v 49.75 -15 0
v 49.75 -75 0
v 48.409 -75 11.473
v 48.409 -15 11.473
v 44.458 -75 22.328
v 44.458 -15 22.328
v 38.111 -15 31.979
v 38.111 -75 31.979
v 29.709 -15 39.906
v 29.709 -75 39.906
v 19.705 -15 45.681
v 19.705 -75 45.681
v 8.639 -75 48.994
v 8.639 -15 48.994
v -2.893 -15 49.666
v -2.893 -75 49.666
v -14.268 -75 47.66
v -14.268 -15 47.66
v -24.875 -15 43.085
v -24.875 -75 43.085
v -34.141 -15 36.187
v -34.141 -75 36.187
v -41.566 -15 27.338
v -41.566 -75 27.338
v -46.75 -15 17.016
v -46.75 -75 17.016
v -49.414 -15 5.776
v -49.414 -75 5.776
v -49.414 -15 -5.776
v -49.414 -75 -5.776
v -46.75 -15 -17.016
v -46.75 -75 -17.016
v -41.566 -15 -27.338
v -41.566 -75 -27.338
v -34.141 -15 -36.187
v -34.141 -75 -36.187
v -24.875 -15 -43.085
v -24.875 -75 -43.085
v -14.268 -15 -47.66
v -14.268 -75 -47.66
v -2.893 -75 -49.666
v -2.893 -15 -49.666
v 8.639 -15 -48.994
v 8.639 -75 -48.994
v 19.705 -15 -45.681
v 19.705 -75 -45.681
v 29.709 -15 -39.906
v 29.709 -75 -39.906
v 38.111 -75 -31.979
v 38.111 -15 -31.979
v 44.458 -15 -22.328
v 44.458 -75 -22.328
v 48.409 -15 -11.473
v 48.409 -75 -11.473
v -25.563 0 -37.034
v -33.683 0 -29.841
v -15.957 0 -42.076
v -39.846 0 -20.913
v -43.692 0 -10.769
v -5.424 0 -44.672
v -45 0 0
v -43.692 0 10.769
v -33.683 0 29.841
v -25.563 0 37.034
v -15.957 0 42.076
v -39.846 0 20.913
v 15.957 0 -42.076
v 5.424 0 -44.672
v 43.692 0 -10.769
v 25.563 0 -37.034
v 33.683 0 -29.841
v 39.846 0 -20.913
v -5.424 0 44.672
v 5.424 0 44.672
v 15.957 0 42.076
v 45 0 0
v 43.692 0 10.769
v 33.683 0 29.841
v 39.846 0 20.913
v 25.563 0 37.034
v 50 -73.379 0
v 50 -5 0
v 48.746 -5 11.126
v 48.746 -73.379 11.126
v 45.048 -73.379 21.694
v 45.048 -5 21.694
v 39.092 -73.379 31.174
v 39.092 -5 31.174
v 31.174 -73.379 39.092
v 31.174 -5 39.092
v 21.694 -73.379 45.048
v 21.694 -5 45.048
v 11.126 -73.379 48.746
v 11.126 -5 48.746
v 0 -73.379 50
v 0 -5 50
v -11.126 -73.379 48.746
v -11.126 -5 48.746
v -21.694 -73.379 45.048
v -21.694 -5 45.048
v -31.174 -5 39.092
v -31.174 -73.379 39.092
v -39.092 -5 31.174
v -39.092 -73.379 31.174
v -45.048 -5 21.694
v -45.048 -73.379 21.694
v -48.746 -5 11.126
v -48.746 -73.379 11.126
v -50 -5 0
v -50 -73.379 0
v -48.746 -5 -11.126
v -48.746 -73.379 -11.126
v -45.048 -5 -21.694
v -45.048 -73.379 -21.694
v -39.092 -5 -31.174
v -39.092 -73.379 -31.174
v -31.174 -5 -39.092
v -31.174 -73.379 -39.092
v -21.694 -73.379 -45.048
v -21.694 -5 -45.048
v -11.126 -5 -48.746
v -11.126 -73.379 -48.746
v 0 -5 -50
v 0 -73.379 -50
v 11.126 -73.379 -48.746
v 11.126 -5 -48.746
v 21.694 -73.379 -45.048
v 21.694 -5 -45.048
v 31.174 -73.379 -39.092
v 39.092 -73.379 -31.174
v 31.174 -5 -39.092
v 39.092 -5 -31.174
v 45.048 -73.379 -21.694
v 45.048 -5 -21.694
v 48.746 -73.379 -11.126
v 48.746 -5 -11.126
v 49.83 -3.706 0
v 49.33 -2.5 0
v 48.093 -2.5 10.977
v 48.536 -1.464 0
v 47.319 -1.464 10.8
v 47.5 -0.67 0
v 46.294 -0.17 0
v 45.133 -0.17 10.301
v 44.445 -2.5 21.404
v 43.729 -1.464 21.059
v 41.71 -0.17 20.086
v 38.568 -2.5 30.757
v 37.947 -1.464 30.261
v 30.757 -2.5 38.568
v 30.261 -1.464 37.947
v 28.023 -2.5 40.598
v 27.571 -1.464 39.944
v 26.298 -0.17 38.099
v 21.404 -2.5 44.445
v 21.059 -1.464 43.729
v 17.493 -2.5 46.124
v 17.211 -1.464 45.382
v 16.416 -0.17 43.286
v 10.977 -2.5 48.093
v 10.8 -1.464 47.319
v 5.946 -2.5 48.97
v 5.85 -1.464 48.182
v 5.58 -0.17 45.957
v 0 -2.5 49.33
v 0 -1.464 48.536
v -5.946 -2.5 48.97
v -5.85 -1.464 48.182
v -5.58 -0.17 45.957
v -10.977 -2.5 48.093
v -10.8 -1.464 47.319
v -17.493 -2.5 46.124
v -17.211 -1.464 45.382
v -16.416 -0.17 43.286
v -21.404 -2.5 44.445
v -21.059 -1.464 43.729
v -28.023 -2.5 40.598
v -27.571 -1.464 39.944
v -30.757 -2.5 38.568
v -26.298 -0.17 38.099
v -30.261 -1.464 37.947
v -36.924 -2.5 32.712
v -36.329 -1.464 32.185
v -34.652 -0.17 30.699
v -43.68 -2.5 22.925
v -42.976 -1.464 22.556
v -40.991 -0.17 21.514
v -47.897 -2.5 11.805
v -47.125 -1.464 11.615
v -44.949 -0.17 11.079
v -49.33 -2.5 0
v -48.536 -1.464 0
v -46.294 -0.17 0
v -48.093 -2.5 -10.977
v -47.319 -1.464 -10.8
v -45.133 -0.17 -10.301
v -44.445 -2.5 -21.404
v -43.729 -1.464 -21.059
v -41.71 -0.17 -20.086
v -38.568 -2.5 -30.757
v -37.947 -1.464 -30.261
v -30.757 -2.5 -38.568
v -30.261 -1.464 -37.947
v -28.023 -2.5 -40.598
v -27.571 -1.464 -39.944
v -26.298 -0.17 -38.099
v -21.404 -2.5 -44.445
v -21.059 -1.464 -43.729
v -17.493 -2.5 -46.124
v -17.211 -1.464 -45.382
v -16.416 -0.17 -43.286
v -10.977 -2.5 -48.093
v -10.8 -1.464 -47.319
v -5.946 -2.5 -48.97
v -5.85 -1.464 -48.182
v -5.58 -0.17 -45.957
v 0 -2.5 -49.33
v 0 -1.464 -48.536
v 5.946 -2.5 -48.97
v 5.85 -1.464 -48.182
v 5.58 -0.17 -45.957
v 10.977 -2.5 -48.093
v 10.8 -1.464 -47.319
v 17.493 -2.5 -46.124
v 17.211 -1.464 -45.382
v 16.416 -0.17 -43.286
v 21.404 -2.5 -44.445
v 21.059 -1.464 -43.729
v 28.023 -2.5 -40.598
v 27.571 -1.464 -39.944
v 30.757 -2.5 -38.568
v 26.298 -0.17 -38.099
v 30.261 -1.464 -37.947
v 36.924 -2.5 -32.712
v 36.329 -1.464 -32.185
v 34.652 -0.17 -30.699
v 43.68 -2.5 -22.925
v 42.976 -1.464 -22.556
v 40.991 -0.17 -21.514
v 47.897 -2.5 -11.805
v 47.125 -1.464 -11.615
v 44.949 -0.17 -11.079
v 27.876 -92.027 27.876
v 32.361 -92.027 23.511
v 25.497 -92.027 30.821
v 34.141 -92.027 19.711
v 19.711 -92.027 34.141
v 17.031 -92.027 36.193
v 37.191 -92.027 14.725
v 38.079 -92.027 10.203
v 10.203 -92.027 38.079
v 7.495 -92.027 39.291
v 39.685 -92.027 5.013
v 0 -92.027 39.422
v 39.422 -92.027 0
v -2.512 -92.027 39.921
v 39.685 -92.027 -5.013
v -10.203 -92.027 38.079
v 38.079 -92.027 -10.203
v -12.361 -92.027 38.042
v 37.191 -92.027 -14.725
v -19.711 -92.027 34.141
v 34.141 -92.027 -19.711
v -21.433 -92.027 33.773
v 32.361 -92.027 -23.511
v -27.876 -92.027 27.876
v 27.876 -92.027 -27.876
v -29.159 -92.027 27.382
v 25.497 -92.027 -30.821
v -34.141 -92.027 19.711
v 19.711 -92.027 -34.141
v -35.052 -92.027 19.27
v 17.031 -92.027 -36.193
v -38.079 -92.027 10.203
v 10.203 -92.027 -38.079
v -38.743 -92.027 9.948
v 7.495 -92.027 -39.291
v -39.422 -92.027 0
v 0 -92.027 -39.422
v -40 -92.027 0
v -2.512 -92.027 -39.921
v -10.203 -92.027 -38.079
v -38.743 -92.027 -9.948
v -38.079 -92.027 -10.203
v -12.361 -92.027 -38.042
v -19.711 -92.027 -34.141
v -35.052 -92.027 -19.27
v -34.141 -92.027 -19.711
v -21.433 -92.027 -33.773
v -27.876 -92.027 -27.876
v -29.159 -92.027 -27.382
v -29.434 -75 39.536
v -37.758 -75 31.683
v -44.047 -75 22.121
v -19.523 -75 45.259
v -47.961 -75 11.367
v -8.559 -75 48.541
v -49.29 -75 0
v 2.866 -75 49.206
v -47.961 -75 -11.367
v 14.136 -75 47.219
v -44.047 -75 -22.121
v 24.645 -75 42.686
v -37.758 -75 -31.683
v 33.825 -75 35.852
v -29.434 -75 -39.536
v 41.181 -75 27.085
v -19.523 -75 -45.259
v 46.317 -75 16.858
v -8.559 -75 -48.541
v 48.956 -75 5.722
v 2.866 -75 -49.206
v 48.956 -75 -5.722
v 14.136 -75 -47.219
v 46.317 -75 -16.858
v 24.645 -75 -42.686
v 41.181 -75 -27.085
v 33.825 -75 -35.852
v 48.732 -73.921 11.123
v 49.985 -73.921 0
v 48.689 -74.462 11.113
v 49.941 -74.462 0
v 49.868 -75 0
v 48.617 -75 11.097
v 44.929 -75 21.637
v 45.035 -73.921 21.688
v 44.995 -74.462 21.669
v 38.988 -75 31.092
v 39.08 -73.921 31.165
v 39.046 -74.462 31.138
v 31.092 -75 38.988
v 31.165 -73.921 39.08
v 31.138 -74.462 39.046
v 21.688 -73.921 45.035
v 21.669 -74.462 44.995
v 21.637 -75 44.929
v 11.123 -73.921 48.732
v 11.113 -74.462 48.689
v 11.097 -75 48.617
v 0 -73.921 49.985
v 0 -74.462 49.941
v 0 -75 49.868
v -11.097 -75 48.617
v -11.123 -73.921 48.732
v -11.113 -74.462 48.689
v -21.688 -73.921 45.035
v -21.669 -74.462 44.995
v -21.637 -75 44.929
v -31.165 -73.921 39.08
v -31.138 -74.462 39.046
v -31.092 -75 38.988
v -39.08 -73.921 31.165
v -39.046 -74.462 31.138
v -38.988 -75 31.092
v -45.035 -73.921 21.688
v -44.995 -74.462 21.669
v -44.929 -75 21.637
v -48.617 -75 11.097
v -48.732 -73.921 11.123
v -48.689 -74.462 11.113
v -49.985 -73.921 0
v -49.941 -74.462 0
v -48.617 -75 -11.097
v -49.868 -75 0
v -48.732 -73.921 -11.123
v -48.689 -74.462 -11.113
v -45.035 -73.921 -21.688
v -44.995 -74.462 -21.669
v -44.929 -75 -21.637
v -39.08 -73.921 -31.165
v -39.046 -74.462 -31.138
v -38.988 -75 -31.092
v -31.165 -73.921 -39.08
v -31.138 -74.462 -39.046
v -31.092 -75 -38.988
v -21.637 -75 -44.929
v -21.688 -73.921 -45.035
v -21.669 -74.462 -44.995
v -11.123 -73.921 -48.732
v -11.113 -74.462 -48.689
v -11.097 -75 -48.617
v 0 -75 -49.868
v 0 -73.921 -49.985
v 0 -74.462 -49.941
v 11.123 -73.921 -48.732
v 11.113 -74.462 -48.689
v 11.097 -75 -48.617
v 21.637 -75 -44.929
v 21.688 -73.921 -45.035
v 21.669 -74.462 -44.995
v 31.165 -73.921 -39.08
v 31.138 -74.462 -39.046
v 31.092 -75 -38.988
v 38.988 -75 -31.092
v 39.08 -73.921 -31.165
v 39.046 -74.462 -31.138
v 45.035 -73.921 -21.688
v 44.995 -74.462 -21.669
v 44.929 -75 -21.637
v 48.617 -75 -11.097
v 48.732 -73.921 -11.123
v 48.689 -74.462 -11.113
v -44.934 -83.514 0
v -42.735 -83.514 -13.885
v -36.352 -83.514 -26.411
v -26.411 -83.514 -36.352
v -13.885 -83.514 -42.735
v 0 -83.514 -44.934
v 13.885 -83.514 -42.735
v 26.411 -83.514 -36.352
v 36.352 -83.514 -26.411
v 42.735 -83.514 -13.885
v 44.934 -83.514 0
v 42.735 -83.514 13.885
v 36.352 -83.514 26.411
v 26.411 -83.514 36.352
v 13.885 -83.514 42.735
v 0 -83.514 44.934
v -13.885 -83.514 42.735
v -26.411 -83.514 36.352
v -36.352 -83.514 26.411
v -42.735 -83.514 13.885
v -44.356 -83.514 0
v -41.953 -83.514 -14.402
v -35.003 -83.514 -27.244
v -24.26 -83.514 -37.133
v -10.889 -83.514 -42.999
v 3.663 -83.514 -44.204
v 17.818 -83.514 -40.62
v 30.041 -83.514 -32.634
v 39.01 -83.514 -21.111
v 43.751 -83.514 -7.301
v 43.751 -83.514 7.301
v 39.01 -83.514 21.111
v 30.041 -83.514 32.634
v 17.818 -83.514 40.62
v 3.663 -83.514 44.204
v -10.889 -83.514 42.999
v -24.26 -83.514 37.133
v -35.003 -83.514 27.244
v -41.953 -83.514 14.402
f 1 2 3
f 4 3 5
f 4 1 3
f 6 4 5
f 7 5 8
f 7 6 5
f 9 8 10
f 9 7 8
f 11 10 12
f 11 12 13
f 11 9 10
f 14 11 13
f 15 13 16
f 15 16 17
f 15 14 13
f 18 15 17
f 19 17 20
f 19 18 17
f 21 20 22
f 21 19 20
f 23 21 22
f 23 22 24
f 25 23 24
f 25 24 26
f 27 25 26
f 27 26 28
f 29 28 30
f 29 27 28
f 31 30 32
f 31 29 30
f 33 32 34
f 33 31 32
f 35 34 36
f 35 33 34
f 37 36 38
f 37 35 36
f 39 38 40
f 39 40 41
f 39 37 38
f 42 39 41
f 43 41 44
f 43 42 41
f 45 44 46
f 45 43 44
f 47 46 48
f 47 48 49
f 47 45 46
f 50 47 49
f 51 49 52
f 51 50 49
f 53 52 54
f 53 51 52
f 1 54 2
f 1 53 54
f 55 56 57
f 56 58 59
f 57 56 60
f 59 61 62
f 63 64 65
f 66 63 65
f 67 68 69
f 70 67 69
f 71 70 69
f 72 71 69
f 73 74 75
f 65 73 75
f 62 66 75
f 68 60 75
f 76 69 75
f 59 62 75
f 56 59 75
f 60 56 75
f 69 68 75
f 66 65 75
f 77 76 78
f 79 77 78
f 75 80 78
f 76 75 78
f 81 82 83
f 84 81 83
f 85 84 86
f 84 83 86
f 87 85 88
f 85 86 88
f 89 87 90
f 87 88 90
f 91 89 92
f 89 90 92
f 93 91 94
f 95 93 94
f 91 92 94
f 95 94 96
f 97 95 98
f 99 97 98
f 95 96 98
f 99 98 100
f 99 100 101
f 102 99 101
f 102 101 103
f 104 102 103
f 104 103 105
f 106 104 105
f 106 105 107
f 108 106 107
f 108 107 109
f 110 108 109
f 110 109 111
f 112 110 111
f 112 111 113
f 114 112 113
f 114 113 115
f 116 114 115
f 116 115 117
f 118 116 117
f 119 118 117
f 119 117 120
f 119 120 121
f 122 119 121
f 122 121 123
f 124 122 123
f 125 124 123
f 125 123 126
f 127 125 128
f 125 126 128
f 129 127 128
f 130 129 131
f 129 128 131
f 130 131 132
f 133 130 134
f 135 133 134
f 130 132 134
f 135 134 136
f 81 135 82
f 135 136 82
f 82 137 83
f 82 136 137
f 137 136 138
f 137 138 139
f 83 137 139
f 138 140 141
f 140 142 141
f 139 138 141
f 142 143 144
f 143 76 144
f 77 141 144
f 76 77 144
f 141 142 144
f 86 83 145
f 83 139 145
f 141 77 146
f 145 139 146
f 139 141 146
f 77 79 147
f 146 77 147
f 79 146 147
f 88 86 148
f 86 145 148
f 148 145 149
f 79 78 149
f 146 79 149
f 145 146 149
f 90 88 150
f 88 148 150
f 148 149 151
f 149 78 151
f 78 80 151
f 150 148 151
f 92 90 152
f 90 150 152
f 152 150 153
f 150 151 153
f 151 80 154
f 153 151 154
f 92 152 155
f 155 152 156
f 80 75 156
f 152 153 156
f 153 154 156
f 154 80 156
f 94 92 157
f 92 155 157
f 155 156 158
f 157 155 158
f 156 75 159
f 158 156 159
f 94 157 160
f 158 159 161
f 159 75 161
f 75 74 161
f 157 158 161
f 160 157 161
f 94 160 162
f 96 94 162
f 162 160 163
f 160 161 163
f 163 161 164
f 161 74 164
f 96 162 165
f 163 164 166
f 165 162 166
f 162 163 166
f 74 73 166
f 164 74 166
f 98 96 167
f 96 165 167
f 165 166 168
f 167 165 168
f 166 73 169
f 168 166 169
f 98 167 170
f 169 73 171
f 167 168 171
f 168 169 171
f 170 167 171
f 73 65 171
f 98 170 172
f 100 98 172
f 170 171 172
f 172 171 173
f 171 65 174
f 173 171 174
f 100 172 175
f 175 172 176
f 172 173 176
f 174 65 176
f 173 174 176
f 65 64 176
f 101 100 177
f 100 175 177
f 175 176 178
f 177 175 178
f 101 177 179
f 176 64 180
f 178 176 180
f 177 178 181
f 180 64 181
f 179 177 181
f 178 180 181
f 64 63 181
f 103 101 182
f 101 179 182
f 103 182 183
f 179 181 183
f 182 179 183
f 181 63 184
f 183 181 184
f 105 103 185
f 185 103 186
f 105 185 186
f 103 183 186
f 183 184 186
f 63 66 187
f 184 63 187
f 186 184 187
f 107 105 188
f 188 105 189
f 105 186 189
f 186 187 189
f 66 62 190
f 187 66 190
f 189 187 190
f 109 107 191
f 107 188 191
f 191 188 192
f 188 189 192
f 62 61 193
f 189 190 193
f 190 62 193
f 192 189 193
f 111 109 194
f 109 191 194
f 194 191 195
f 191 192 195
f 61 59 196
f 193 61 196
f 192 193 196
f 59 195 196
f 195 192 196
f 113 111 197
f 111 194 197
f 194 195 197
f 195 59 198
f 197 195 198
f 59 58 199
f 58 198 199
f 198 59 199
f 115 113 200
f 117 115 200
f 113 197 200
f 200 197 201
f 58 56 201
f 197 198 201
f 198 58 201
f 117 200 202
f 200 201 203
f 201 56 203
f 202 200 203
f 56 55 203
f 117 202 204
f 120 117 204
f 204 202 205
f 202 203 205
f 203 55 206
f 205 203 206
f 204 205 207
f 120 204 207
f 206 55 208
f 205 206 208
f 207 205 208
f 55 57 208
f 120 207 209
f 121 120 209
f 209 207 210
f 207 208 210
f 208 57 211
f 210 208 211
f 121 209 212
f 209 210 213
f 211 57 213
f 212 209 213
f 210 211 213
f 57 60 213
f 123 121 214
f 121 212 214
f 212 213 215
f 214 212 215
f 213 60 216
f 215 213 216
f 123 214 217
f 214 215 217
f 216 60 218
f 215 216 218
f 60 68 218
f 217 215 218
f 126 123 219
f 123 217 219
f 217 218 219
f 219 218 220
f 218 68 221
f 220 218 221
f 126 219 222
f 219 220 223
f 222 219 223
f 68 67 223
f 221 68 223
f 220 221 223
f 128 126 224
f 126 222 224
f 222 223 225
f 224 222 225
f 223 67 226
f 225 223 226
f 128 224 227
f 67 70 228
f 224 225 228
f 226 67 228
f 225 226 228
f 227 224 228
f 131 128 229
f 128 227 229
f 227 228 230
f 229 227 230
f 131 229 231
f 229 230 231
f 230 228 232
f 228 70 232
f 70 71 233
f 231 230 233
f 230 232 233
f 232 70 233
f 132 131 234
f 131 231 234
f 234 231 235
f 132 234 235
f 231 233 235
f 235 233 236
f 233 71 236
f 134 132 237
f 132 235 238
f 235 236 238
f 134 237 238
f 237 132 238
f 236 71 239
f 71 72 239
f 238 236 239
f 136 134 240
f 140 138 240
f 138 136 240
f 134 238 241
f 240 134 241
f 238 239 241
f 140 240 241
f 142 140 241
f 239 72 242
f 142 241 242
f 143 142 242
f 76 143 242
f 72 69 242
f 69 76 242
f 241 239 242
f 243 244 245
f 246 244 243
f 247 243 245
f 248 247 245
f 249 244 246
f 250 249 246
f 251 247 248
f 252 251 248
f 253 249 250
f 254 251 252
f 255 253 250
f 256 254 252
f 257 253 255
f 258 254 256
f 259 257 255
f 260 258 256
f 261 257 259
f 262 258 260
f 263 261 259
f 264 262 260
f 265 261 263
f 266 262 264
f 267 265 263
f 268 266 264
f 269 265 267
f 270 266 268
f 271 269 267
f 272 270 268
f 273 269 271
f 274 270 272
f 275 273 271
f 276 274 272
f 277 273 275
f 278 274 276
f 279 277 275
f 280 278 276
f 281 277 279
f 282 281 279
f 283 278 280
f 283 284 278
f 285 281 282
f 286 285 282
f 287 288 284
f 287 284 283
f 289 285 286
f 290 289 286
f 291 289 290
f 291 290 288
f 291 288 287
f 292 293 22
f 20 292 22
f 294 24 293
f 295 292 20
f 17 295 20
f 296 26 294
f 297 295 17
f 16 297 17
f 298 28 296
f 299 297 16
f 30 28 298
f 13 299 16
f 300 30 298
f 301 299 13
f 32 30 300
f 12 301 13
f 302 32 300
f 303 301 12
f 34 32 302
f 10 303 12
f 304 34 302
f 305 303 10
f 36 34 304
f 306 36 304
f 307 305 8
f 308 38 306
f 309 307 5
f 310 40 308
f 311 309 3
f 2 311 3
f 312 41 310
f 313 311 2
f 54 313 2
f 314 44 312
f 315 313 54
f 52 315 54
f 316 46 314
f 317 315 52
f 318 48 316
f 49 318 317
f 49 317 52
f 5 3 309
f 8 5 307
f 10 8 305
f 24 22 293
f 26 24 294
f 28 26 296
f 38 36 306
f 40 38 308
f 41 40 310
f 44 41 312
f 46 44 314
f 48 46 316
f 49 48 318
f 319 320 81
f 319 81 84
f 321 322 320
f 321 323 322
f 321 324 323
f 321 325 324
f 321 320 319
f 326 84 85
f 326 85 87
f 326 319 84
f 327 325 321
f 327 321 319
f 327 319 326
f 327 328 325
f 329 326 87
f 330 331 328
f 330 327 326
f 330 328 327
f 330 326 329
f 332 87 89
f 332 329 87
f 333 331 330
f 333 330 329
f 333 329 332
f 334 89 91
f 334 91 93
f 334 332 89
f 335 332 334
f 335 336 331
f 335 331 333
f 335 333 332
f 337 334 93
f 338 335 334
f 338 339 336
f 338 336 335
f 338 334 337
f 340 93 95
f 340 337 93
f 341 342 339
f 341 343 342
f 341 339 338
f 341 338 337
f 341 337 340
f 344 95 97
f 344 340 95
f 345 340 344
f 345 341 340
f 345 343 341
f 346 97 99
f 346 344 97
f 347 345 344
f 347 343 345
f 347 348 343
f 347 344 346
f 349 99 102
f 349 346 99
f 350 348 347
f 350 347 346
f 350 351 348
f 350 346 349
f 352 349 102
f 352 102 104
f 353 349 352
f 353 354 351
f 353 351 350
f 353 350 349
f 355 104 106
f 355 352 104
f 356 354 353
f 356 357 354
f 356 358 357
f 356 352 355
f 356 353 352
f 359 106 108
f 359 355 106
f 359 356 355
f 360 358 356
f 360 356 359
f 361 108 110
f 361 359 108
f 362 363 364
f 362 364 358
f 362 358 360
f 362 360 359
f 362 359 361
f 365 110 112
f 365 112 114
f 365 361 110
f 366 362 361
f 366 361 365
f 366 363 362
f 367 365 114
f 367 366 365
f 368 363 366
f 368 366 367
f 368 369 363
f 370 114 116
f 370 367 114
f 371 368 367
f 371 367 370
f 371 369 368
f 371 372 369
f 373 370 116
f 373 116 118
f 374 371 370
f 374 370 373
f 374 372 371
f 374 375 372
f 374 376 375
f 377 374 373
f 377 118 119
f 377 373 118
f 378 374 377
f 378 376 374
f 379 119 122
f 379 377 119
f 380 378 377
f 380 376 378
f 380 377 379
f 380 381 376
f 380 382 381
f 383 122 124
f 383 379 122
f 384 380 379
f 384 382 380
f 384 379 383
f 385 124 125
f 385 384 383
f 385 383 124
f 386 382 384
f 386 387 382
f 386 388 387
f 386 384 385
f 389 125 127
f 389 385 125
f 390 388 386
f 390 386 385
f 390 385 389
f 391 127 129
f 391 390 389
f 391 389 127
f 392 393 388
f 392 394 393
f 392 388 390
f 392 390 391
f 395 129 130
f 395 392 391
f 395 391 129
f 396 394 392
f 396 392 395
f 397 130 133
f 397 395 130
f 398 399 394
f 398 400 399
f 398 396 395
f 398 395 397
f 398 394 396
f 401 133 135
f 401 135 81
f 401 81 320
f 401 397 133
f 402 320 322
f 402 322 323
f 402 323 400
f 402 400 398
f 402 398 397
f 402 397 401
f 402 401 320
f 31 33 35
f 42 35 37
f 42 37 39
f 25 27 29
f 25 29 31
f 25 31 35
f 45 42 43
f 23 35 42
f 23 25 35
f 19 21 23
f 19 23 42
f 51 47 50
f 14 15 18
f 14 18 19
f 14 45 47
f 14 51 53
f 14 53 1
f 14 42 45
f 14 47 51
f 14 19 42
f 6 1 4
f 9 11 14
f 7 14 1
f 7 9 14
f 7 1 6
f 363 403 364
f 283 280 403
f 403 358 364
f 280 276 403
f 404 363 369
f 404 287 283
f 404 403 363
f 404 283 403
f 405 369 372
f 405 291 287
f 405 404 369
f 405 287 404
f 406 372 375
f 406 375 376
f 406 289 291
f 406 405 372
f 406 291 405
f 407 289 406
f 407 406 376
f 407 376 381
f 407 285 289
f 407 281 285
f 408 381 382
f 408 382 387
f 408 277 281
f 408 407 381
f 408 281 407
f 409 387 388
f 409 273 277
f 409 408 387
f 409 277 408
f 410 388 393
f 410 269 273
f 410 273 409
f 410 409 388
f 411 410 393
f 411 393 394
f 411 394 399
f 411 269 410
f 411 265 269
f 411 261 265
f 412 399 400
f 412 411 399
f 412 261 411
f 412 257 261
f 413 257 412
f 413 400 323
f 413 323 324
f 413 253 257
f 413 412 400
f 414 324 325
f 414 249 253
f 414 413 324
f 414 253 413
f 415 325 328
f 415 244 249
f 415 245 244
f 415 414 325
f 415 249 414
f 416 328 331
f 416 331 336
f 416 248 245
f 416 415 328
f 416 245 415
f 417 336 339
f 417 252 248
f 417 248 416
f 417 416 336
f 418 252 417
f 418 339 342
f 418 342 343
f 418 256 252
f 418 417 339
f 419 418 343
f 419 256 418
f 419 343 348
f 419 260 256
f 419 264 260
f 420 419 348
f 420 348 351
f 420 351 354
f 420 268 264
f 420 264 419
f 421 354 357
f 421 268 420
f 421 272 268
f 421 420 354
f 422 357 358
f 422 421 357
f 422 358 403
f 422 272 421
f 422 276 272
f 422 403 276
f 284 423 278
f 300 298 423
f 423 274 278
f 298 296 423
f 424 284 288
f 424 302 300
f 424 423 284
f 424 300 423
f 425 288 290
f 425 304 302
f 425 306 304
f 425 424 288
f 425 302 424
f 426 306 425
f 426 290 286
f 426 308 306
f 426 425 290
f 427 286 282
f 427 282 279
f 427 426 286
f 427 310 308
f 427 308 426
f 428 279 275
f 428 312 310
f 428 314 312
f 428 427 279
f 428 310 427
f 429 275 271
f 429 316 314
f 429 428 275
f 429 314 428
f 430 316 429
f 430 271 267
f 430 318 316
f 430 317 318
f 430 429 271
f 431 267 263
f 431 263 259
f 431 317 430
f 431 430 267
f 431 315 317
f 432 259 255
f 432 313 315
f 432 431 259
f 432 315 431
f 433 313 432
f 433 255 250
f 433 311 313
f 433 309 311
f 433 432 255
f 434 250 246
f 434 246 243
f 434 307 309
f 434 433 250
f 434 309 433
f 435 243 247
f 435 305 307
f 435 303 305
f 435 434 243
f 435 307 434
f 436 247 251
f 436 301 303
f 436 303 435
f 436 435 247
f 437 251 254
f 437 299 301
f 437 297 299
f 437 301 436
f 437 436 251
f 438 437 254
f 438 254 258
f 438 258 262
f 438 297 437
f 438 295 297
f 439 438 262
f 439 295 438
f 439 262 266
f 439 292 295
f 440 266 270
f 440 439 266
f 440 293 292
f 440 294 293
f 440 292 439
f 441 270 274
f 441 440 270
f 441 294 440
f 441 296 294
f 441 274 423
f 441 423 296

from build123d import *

# Parameters (mm, degrees)
F0_R     = 50
F1_DEPTH = 15
F2_R     = 50
F2_R_2   = 49.75
F3_DEPTH = 60
F6_R     = 5


# Not quite as in the source:
# - a fillet or chamfer that OpenCascade refuses, or shapes differently, is made with other operations: its cross-section is extruded or revolved along the edge and cut away or added


with BuildPart() as f1:
    # F0 (on Front) → F1 (new body)
    with BuildSketch(Plane.XZ):
        Circle(F0_R)
    extrude(amount=F1_DEPTH)

    # F2 (on face) → F3 (join)
    with BuildSketch(Plane.XZ.offset(15)):
        Circle(F2_R)
        Circle(F2_R_2, mode=Mode.SUBTRACT)
    extrude(amount=F3_DEPTH)

    # F4 (on Top) → F5 (revolve)
    with BuildSketch(Plane.XY):
        Polygon((-40, -92.0273140073), (-39.4221065602, -92.0273140073), (-49.289773818, -75), (-49.8676672578, -75), align=None)
    revolve(axis=Axis((0, -82.0273140073, 0), (0, -1, 0)))

    # F6
    f6_edges = [f1.edges().sort_by_distance(p)[0] for p in [
        (-50, 0, 0),
    ]]
    fillet(f6_edges, radius=F6_R)

    # F7: fillet of radius 10 on 1 edges, made by hand

    # F7_s1 → F7_t2 (revolve, cut)
    with BuildSketch(Plane.XY):
        with BuildLine():
            ThreePointArc((50, -73.378536806), (49.9668619078, -74.1919639453), (49.8676672578, -75))
            Line((49.8676672578, -75), (50, -75))
            Line((50, -75), (50, -73.378536806))
        make_face()
    revolve(axis=Axis((0, -75, 0), (0, -1, 0)), mode=Mode.SUBTRACT)


solid = f1.part
